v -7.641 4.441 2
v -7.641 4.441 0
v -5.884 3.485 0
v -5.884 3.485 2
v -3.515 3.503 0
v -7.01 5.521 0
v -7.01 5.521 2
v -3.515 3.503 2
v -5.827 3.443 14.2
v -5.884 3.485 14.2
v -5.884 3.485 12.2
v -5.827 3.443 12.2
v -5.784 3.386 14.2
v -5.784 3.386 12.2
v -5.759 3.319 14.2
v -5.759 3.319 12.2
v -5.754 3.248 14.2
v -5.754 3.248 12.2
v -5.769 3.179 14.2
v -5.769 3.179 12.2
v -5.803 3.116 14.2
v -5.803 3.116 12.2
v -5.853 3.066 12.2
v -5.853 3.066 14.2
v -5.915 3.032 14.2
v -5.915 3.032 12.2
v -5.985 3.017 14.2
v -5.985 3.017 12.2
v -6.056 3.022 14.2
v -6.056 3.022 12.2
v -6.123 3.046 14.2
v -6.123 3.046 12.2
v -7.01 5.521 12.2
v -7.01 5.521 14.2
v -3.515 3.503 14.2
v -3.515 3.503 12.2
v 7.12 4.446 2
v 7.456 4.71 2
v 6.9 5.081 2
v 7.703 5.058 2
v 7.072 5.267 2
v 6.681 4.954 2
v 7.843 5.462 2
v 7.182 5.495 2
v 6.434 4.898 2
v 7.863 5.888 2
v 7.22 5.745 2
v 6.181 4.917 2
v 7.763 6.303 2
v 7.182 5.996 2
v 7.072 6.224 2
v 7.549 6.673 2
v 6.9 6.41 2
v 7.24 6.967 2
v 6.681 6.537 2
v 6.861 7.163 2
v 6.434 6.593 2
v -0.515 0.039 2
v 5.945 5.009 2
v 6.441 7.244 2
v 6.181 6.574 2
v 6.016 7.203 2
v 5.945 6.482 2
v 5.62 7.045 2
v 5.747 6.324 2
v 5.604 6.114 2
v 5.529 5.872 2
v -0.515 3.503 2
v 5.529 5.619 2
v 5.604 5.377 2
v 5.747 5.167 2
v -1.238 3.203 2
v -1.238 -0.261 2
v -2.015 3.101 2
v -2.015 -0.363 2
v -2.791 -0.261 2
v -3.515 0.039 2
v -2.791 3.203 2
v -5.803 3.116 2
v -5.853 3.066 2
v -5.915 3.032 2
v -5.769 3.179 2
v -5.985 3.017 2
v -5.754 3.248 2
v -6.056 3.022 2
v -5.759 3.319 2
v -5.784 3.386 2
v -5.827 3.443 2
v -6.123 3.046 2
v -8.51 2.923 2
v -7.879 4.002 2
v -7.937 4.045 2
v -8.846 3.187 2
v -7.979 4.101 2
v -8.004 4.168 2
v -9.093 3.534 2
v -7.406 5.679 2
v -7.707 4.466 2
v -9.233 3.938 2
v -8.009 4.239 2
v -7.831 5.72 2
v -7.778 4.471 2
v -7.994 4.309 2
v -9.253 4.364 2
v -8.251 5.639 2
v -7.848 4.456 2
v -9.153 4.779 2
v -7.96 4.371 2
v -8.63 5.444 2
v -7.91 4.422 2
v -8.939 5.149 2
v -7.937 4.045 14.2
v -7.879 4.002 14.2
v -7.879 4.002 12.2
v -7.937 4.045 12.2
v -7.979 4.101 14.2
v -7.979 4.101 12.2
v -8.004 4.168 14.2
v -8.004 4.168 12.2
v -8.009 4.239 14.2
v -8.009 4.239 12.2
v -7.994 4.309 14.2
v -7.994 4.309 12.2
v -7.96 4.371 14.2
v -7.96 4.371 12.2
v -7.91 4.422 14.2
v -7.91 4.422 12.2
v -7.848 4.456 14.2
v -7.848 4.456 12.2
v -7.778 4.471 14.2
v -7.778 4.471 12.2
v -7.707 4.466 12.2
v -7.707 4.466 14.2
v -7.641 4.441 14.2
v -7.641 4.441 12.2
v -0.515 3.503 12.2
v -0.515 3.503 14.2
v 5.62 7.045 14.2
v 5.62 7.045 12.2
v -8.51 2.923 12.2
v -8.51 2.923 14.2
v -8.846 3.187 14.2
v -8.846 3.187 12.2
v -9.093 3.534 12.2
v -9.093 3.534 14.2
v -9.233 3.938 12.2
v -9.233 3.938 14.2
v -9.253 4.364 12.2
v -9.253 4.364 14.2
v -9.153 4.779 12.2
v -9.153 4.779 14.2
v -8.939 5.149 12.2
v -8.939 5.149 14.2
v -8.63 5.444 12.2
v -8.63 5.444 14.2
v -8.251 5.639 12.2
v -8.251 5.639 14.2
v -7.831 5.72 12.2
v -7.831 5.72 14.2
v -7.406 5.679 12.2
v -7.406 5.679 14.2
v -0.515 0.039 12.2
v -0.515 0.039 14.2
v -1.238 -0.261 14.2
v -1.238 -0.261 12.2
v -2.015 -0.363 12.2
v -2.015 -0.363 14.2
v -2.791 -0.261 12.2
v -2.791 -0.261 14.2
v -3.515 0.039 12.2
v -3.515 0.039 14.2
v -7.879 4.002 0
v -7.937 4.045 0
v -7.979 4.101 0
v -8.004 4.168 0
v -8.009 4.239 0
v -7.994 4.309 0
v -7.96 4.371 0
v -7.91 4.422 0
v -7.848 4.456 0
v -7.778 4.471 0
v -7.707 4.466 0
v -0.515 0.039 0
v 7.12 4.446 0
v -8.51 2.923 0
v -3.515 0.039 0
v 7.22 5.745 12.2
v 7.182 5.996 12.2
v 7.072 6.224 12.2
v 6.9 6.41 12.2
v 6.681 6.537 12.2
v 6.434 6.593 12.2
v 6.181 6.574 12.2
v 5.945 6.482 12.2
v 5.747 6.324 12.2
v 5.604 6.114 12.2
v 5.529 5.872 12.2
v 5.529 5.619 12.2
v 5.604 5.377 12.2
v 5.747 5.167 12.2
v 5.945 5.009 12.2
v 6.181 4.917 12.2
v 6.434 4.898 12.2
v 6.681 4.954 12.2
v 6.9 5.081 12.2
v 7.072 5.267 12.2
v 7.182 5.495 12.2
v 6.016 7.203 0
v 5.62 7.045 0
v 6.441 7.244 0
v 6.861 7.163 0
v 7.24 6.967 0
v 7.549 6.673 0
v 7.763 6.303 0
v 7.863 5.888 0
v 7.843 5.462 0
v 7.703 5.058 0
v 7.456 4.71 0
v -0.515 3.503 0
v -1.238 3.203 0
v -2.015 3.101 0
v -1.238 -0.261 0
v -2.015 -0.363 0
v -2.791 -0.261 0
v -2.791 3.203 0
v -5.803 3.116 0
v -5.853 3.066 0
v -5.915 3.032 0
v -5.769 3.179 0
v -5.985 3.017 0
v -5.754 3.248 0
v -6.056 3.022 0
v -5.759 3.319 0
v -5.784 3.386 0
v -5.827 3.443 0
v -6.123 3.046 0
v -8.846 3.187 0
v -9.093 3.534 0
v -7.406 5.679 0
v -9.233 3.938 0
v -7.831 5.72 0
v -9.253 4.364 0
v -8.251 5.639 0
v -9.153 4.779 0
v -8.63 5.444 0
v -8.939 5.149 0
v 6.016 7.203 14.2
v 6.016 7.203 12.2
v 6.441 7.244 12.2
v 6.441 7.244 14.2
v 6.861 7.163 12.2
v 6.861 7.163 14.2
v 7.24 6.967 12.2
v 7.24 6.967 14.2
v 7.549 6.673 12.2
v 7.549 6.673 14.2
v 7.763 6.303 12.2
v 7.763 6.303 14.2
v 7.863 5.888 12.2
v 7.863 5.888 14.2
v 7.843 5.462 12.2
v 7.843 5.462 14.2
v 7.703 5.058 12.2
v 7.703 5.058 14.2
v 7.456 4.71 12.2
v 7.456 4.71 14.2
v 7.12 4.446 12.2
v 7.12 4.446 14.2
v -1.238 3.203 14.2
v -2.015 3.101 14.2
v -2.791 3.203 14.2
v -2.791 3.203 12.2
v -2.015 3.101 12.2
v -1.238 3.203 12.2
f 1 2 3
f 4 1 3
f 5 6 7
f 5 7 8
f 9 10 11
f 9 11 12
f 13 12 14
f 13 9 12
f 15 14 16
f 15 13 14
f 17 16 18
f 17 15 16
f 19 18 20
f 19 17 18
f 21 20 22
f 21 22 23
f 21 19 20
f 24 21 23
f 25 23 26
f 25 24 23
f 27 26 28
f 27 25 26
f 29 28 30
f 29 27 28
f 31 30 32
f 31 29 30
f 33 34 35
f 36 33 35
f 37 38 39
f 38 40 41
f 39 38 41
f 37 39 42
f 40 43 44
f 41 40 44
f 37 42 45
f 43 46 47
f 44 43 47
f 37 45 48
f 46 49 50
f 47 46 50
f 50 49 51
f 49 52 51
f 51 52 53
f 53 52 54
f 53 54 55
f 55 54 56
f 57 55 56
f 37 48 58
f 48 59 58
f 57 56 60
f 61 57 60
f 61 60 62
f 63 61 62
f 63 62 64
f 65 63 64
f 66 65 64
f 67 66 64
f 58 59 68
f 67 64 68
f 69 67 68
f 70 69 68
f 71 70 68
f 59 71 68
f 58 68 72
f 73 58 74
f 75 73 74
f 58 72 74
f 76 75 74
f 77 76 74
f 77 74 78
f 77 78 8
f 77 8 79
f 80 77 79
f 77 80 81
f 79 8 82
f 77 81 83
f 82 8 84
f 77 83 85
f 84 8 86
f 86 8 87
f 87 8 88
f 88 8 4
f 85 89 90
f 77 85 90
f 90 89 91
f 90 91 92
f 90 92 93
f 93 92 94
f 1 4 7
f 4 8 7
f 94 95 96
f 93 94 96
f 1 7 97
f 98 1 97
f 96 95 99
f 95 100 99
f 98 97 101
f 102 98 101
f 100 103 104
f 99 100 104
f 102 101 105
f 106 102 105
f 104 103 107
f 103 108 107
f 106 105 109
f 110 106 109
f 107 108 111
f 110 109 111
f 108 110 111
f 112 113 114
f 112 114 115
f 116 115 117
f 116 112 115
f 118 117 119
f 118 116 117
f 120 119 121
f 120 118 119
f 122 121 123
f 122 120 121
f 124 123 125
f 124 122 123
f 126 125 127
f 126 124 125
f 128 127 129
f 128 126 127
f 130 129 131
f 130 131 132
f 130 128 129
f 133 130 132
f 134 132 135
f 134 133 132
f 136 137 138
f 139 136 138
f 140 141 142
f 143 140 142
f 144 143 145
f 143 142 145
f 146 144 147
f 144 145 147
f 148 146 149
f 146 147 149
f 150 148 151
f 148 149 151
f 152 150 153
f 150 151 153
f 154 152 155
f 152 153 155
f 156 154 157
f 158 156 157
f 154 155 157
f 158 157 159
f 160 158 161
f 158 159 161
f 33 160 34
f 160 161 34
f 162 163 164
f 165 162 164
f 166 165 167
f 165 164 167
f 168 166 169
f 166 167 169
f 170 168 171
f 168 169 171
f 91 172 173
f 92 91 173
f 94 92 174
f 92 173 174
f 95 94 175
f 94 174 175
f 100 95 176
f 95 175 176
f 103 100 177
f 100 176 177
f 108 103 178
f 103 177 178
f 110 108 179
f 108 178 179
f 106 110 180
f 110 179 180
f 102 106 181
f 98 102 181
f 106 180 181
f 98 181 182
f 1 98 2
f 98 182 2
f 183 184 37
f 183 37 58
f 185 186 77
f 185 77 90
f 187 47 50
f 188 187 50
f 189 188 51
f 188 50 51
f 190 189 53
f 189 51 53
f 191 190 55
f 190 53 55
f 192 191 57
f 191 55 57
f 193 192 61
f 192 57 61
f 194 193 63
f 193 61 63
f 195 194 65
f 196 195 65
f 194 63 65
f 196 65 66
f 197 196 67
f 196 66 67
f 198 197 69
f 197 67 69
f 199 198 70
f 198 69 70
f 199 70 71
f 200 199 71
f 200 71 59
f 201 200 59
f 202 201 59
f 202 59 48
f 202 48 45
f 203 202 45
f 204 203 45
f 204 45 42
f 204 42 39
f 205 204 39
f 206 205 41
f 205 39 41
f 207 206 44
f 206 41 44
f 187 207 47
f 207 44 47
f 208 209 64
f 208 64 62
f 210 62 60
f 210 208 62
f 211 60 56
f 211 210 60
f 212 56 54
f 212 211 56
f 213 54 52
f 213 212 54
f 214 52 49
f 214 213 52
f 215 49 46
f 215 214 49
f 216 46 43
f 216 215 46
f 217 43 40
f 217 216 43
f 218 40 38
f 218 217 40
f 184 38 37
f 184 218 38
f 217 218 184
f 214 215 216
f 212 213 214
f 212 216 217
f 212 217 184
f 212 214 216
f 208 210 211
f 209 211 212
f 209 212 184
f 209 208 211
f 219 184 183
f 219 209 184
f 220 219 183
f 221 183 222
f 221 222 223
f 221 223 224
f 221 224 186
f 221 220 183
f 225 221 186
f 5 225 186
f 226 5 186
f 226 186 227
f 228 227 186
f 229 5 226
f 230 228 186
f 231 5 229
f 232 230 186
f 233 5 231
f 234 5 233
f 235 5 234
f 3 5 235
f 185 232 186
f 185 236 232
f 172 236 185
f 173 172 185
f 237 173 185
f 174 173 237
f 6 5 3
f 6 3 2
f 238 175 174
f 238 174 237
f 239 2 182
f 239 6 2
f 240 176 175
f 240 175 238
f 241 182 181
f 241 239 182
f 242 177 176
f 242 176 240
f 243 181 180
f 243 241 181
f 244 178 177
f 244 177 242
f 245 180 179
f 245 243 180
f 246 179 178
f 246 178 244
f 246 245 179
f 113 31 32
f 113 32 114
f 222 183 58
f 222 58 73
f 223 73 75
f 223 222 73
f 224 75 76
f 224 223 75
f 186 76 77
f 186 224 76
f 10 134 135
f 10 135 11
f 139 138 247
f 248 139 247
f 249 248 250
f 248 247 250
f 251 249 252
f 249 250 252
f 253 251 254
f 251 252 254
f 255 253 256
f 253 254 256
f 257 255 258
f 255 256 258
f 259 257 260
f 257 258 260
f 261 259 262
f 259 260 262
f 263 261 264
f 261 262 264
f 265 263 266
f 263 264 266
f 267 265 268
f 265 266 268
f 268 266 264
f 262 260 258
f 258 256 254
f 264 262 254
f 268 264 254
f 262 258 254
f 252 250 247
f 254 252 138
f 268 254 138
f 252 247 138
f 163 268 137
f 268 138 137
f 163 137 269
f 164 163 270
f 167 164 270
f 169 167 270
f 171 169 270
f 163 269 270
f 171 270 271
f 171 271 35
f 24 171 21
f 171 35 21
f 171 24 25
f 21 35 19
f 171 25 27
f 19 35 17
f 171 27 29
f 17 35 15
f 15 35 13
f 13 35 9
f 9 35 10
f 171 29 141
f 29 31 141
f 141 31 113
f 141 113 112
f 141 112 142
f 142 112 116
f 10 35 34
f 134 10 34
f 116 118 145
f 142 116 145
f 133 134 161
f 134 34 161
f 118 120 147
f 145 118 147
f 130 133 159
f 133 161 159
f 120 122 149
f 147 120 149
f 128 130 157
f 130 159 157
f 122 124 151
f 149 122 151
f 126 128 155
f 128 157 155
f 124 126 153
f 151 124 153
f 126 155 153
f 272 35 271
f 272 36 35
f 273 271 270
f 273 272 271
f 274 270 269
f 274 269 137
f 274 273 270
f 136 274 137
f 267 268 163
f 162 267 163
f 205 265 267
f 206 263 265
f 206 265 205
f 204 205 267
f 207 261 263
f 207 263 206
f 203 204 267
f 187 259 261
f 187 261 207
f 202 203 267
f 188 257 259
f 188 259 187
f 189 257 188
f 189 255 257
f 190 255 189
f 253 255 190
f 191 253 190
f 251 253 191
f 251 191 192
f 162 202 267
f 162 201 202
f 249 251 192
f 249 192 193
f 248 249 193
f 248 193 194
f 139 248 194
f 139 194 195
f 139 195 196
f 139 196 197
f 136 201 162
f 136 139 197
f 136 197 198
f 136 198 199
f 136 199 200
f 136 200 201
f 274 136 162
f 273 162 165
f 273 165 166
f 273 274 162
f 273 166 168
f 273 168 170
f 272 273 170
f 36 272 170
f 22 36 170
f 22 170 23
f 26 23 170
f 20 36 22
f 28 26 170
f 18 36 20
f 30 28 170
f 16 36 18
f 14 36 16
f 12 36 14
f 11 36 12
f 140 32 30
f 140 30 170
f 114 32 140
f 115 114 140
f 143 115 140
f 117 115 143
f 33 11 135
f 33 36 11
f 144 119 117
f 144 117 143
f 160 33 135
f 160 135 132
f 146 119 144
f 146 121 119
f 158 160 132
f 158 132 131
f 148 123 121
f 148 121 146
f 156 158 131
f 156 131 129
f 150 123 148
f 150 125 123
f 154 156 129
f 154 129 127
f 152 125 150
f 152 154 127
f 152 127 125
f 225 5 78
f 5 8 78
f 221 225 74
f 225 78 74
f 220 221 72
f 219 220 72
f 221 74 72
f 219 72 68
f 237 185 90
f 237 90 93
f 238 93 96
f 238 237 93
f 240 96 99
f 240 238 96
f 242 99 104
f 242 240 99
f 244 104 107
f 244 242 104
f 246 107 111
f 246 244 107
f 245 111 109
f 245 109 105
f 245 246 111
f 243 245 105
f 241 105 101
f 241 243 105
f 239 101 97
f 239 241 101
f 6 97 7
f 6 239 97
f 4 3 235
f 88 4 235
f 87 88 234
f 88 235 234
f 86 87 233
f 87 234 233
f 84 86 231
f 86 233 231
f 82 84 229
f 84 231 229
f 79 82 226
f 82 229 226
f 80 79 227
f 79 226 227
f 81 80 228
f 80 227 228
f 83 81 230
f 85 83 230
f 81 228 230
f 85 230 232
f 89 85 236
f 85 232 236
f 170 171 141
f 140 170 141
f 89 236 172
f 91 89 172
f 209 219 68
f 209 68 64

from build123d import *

# Parameters (mm, degrees)
BOSS_EXTRUDE1_DEPTH = 2
SKETCH2_R           = 0.85
BOSS_EXTRUDE2_DEPTH = 10.2
FILLET1_R           = 3


with BuildPart() as part:
    # Sketch1 → Boss-Extrude1 (new body)
    with BuildSketch(Plane.XY):
        with BuildLine():
            Line((-7.01, 5.520677243), (-2.014670258, 2.636622271))
            Line((-2.014670258, 2.636622271), (5.62, 7.0445012))
            ThreePointArc((5.62, 7.0445012), (7.669038106, 6.495463094), (7.12, 4.446424988))
            Line((7.12, 4.446424988), (-0.514670258, 0.03854606))
            ThreePointArc((-0.514670258, 0.03854606), (-2.014670258, -0.363377729), (-3.514670258, 0.03854606))
            Line((-3.514670258, 0.03854606), (-8.51, 2.922601032))
            ThreePointArc((-8.51, 2.922601032), (-9.059038106, 4.971639137), (-7.01, 5.520677243))
        make_face()
        with BuildLine():
            Line((-7.640528879, 4.441244809), (-5.883683502, 3.48547584))
            ThreePointArc((-5.883683502, 3.48547584), (-5.783548951, 3.146399047), (-6.122625744, 3.046264496))
            Line((-6.122625744, 3.046264496), (-7.879471121, 4.002033465))
            ThreePointArc((-7.879471121, 4.002033465), (-7.979605672, 4.341110258), (-7.640528879, 4.441244809))
        make_face(mode=Mode.SUBTRACT)
    boss_extrude1 = extrude(amount=BOSS_EXTRUDE1_DEPTH)

    # Sketch2 → Boss-Extrude2 (add)
    with BuildSketch(Plane.XY.offset(2)):
        with Locations((6.37, 5.745463094)):
            Circle(SKETCH2_R)
    extrude(amount=BOSS_EXTRUDE2_DEPTH)

    # Mirror1: Boss-Extrude1 across plane
    add(boss_extrude1.mirror(Plane.XY.offset(7.1)))

    # Fillet1
    fillet1_edges = [part.edges().sort_by_distance(p)[0] for p in [
        (-2.014670258, 2.636622271, 1),
        (-2.014670258, 2.636622271, 13.2),
    ]]
    fillet(fillet1_edges, radius=FILLET1_R)


solid = part.part
